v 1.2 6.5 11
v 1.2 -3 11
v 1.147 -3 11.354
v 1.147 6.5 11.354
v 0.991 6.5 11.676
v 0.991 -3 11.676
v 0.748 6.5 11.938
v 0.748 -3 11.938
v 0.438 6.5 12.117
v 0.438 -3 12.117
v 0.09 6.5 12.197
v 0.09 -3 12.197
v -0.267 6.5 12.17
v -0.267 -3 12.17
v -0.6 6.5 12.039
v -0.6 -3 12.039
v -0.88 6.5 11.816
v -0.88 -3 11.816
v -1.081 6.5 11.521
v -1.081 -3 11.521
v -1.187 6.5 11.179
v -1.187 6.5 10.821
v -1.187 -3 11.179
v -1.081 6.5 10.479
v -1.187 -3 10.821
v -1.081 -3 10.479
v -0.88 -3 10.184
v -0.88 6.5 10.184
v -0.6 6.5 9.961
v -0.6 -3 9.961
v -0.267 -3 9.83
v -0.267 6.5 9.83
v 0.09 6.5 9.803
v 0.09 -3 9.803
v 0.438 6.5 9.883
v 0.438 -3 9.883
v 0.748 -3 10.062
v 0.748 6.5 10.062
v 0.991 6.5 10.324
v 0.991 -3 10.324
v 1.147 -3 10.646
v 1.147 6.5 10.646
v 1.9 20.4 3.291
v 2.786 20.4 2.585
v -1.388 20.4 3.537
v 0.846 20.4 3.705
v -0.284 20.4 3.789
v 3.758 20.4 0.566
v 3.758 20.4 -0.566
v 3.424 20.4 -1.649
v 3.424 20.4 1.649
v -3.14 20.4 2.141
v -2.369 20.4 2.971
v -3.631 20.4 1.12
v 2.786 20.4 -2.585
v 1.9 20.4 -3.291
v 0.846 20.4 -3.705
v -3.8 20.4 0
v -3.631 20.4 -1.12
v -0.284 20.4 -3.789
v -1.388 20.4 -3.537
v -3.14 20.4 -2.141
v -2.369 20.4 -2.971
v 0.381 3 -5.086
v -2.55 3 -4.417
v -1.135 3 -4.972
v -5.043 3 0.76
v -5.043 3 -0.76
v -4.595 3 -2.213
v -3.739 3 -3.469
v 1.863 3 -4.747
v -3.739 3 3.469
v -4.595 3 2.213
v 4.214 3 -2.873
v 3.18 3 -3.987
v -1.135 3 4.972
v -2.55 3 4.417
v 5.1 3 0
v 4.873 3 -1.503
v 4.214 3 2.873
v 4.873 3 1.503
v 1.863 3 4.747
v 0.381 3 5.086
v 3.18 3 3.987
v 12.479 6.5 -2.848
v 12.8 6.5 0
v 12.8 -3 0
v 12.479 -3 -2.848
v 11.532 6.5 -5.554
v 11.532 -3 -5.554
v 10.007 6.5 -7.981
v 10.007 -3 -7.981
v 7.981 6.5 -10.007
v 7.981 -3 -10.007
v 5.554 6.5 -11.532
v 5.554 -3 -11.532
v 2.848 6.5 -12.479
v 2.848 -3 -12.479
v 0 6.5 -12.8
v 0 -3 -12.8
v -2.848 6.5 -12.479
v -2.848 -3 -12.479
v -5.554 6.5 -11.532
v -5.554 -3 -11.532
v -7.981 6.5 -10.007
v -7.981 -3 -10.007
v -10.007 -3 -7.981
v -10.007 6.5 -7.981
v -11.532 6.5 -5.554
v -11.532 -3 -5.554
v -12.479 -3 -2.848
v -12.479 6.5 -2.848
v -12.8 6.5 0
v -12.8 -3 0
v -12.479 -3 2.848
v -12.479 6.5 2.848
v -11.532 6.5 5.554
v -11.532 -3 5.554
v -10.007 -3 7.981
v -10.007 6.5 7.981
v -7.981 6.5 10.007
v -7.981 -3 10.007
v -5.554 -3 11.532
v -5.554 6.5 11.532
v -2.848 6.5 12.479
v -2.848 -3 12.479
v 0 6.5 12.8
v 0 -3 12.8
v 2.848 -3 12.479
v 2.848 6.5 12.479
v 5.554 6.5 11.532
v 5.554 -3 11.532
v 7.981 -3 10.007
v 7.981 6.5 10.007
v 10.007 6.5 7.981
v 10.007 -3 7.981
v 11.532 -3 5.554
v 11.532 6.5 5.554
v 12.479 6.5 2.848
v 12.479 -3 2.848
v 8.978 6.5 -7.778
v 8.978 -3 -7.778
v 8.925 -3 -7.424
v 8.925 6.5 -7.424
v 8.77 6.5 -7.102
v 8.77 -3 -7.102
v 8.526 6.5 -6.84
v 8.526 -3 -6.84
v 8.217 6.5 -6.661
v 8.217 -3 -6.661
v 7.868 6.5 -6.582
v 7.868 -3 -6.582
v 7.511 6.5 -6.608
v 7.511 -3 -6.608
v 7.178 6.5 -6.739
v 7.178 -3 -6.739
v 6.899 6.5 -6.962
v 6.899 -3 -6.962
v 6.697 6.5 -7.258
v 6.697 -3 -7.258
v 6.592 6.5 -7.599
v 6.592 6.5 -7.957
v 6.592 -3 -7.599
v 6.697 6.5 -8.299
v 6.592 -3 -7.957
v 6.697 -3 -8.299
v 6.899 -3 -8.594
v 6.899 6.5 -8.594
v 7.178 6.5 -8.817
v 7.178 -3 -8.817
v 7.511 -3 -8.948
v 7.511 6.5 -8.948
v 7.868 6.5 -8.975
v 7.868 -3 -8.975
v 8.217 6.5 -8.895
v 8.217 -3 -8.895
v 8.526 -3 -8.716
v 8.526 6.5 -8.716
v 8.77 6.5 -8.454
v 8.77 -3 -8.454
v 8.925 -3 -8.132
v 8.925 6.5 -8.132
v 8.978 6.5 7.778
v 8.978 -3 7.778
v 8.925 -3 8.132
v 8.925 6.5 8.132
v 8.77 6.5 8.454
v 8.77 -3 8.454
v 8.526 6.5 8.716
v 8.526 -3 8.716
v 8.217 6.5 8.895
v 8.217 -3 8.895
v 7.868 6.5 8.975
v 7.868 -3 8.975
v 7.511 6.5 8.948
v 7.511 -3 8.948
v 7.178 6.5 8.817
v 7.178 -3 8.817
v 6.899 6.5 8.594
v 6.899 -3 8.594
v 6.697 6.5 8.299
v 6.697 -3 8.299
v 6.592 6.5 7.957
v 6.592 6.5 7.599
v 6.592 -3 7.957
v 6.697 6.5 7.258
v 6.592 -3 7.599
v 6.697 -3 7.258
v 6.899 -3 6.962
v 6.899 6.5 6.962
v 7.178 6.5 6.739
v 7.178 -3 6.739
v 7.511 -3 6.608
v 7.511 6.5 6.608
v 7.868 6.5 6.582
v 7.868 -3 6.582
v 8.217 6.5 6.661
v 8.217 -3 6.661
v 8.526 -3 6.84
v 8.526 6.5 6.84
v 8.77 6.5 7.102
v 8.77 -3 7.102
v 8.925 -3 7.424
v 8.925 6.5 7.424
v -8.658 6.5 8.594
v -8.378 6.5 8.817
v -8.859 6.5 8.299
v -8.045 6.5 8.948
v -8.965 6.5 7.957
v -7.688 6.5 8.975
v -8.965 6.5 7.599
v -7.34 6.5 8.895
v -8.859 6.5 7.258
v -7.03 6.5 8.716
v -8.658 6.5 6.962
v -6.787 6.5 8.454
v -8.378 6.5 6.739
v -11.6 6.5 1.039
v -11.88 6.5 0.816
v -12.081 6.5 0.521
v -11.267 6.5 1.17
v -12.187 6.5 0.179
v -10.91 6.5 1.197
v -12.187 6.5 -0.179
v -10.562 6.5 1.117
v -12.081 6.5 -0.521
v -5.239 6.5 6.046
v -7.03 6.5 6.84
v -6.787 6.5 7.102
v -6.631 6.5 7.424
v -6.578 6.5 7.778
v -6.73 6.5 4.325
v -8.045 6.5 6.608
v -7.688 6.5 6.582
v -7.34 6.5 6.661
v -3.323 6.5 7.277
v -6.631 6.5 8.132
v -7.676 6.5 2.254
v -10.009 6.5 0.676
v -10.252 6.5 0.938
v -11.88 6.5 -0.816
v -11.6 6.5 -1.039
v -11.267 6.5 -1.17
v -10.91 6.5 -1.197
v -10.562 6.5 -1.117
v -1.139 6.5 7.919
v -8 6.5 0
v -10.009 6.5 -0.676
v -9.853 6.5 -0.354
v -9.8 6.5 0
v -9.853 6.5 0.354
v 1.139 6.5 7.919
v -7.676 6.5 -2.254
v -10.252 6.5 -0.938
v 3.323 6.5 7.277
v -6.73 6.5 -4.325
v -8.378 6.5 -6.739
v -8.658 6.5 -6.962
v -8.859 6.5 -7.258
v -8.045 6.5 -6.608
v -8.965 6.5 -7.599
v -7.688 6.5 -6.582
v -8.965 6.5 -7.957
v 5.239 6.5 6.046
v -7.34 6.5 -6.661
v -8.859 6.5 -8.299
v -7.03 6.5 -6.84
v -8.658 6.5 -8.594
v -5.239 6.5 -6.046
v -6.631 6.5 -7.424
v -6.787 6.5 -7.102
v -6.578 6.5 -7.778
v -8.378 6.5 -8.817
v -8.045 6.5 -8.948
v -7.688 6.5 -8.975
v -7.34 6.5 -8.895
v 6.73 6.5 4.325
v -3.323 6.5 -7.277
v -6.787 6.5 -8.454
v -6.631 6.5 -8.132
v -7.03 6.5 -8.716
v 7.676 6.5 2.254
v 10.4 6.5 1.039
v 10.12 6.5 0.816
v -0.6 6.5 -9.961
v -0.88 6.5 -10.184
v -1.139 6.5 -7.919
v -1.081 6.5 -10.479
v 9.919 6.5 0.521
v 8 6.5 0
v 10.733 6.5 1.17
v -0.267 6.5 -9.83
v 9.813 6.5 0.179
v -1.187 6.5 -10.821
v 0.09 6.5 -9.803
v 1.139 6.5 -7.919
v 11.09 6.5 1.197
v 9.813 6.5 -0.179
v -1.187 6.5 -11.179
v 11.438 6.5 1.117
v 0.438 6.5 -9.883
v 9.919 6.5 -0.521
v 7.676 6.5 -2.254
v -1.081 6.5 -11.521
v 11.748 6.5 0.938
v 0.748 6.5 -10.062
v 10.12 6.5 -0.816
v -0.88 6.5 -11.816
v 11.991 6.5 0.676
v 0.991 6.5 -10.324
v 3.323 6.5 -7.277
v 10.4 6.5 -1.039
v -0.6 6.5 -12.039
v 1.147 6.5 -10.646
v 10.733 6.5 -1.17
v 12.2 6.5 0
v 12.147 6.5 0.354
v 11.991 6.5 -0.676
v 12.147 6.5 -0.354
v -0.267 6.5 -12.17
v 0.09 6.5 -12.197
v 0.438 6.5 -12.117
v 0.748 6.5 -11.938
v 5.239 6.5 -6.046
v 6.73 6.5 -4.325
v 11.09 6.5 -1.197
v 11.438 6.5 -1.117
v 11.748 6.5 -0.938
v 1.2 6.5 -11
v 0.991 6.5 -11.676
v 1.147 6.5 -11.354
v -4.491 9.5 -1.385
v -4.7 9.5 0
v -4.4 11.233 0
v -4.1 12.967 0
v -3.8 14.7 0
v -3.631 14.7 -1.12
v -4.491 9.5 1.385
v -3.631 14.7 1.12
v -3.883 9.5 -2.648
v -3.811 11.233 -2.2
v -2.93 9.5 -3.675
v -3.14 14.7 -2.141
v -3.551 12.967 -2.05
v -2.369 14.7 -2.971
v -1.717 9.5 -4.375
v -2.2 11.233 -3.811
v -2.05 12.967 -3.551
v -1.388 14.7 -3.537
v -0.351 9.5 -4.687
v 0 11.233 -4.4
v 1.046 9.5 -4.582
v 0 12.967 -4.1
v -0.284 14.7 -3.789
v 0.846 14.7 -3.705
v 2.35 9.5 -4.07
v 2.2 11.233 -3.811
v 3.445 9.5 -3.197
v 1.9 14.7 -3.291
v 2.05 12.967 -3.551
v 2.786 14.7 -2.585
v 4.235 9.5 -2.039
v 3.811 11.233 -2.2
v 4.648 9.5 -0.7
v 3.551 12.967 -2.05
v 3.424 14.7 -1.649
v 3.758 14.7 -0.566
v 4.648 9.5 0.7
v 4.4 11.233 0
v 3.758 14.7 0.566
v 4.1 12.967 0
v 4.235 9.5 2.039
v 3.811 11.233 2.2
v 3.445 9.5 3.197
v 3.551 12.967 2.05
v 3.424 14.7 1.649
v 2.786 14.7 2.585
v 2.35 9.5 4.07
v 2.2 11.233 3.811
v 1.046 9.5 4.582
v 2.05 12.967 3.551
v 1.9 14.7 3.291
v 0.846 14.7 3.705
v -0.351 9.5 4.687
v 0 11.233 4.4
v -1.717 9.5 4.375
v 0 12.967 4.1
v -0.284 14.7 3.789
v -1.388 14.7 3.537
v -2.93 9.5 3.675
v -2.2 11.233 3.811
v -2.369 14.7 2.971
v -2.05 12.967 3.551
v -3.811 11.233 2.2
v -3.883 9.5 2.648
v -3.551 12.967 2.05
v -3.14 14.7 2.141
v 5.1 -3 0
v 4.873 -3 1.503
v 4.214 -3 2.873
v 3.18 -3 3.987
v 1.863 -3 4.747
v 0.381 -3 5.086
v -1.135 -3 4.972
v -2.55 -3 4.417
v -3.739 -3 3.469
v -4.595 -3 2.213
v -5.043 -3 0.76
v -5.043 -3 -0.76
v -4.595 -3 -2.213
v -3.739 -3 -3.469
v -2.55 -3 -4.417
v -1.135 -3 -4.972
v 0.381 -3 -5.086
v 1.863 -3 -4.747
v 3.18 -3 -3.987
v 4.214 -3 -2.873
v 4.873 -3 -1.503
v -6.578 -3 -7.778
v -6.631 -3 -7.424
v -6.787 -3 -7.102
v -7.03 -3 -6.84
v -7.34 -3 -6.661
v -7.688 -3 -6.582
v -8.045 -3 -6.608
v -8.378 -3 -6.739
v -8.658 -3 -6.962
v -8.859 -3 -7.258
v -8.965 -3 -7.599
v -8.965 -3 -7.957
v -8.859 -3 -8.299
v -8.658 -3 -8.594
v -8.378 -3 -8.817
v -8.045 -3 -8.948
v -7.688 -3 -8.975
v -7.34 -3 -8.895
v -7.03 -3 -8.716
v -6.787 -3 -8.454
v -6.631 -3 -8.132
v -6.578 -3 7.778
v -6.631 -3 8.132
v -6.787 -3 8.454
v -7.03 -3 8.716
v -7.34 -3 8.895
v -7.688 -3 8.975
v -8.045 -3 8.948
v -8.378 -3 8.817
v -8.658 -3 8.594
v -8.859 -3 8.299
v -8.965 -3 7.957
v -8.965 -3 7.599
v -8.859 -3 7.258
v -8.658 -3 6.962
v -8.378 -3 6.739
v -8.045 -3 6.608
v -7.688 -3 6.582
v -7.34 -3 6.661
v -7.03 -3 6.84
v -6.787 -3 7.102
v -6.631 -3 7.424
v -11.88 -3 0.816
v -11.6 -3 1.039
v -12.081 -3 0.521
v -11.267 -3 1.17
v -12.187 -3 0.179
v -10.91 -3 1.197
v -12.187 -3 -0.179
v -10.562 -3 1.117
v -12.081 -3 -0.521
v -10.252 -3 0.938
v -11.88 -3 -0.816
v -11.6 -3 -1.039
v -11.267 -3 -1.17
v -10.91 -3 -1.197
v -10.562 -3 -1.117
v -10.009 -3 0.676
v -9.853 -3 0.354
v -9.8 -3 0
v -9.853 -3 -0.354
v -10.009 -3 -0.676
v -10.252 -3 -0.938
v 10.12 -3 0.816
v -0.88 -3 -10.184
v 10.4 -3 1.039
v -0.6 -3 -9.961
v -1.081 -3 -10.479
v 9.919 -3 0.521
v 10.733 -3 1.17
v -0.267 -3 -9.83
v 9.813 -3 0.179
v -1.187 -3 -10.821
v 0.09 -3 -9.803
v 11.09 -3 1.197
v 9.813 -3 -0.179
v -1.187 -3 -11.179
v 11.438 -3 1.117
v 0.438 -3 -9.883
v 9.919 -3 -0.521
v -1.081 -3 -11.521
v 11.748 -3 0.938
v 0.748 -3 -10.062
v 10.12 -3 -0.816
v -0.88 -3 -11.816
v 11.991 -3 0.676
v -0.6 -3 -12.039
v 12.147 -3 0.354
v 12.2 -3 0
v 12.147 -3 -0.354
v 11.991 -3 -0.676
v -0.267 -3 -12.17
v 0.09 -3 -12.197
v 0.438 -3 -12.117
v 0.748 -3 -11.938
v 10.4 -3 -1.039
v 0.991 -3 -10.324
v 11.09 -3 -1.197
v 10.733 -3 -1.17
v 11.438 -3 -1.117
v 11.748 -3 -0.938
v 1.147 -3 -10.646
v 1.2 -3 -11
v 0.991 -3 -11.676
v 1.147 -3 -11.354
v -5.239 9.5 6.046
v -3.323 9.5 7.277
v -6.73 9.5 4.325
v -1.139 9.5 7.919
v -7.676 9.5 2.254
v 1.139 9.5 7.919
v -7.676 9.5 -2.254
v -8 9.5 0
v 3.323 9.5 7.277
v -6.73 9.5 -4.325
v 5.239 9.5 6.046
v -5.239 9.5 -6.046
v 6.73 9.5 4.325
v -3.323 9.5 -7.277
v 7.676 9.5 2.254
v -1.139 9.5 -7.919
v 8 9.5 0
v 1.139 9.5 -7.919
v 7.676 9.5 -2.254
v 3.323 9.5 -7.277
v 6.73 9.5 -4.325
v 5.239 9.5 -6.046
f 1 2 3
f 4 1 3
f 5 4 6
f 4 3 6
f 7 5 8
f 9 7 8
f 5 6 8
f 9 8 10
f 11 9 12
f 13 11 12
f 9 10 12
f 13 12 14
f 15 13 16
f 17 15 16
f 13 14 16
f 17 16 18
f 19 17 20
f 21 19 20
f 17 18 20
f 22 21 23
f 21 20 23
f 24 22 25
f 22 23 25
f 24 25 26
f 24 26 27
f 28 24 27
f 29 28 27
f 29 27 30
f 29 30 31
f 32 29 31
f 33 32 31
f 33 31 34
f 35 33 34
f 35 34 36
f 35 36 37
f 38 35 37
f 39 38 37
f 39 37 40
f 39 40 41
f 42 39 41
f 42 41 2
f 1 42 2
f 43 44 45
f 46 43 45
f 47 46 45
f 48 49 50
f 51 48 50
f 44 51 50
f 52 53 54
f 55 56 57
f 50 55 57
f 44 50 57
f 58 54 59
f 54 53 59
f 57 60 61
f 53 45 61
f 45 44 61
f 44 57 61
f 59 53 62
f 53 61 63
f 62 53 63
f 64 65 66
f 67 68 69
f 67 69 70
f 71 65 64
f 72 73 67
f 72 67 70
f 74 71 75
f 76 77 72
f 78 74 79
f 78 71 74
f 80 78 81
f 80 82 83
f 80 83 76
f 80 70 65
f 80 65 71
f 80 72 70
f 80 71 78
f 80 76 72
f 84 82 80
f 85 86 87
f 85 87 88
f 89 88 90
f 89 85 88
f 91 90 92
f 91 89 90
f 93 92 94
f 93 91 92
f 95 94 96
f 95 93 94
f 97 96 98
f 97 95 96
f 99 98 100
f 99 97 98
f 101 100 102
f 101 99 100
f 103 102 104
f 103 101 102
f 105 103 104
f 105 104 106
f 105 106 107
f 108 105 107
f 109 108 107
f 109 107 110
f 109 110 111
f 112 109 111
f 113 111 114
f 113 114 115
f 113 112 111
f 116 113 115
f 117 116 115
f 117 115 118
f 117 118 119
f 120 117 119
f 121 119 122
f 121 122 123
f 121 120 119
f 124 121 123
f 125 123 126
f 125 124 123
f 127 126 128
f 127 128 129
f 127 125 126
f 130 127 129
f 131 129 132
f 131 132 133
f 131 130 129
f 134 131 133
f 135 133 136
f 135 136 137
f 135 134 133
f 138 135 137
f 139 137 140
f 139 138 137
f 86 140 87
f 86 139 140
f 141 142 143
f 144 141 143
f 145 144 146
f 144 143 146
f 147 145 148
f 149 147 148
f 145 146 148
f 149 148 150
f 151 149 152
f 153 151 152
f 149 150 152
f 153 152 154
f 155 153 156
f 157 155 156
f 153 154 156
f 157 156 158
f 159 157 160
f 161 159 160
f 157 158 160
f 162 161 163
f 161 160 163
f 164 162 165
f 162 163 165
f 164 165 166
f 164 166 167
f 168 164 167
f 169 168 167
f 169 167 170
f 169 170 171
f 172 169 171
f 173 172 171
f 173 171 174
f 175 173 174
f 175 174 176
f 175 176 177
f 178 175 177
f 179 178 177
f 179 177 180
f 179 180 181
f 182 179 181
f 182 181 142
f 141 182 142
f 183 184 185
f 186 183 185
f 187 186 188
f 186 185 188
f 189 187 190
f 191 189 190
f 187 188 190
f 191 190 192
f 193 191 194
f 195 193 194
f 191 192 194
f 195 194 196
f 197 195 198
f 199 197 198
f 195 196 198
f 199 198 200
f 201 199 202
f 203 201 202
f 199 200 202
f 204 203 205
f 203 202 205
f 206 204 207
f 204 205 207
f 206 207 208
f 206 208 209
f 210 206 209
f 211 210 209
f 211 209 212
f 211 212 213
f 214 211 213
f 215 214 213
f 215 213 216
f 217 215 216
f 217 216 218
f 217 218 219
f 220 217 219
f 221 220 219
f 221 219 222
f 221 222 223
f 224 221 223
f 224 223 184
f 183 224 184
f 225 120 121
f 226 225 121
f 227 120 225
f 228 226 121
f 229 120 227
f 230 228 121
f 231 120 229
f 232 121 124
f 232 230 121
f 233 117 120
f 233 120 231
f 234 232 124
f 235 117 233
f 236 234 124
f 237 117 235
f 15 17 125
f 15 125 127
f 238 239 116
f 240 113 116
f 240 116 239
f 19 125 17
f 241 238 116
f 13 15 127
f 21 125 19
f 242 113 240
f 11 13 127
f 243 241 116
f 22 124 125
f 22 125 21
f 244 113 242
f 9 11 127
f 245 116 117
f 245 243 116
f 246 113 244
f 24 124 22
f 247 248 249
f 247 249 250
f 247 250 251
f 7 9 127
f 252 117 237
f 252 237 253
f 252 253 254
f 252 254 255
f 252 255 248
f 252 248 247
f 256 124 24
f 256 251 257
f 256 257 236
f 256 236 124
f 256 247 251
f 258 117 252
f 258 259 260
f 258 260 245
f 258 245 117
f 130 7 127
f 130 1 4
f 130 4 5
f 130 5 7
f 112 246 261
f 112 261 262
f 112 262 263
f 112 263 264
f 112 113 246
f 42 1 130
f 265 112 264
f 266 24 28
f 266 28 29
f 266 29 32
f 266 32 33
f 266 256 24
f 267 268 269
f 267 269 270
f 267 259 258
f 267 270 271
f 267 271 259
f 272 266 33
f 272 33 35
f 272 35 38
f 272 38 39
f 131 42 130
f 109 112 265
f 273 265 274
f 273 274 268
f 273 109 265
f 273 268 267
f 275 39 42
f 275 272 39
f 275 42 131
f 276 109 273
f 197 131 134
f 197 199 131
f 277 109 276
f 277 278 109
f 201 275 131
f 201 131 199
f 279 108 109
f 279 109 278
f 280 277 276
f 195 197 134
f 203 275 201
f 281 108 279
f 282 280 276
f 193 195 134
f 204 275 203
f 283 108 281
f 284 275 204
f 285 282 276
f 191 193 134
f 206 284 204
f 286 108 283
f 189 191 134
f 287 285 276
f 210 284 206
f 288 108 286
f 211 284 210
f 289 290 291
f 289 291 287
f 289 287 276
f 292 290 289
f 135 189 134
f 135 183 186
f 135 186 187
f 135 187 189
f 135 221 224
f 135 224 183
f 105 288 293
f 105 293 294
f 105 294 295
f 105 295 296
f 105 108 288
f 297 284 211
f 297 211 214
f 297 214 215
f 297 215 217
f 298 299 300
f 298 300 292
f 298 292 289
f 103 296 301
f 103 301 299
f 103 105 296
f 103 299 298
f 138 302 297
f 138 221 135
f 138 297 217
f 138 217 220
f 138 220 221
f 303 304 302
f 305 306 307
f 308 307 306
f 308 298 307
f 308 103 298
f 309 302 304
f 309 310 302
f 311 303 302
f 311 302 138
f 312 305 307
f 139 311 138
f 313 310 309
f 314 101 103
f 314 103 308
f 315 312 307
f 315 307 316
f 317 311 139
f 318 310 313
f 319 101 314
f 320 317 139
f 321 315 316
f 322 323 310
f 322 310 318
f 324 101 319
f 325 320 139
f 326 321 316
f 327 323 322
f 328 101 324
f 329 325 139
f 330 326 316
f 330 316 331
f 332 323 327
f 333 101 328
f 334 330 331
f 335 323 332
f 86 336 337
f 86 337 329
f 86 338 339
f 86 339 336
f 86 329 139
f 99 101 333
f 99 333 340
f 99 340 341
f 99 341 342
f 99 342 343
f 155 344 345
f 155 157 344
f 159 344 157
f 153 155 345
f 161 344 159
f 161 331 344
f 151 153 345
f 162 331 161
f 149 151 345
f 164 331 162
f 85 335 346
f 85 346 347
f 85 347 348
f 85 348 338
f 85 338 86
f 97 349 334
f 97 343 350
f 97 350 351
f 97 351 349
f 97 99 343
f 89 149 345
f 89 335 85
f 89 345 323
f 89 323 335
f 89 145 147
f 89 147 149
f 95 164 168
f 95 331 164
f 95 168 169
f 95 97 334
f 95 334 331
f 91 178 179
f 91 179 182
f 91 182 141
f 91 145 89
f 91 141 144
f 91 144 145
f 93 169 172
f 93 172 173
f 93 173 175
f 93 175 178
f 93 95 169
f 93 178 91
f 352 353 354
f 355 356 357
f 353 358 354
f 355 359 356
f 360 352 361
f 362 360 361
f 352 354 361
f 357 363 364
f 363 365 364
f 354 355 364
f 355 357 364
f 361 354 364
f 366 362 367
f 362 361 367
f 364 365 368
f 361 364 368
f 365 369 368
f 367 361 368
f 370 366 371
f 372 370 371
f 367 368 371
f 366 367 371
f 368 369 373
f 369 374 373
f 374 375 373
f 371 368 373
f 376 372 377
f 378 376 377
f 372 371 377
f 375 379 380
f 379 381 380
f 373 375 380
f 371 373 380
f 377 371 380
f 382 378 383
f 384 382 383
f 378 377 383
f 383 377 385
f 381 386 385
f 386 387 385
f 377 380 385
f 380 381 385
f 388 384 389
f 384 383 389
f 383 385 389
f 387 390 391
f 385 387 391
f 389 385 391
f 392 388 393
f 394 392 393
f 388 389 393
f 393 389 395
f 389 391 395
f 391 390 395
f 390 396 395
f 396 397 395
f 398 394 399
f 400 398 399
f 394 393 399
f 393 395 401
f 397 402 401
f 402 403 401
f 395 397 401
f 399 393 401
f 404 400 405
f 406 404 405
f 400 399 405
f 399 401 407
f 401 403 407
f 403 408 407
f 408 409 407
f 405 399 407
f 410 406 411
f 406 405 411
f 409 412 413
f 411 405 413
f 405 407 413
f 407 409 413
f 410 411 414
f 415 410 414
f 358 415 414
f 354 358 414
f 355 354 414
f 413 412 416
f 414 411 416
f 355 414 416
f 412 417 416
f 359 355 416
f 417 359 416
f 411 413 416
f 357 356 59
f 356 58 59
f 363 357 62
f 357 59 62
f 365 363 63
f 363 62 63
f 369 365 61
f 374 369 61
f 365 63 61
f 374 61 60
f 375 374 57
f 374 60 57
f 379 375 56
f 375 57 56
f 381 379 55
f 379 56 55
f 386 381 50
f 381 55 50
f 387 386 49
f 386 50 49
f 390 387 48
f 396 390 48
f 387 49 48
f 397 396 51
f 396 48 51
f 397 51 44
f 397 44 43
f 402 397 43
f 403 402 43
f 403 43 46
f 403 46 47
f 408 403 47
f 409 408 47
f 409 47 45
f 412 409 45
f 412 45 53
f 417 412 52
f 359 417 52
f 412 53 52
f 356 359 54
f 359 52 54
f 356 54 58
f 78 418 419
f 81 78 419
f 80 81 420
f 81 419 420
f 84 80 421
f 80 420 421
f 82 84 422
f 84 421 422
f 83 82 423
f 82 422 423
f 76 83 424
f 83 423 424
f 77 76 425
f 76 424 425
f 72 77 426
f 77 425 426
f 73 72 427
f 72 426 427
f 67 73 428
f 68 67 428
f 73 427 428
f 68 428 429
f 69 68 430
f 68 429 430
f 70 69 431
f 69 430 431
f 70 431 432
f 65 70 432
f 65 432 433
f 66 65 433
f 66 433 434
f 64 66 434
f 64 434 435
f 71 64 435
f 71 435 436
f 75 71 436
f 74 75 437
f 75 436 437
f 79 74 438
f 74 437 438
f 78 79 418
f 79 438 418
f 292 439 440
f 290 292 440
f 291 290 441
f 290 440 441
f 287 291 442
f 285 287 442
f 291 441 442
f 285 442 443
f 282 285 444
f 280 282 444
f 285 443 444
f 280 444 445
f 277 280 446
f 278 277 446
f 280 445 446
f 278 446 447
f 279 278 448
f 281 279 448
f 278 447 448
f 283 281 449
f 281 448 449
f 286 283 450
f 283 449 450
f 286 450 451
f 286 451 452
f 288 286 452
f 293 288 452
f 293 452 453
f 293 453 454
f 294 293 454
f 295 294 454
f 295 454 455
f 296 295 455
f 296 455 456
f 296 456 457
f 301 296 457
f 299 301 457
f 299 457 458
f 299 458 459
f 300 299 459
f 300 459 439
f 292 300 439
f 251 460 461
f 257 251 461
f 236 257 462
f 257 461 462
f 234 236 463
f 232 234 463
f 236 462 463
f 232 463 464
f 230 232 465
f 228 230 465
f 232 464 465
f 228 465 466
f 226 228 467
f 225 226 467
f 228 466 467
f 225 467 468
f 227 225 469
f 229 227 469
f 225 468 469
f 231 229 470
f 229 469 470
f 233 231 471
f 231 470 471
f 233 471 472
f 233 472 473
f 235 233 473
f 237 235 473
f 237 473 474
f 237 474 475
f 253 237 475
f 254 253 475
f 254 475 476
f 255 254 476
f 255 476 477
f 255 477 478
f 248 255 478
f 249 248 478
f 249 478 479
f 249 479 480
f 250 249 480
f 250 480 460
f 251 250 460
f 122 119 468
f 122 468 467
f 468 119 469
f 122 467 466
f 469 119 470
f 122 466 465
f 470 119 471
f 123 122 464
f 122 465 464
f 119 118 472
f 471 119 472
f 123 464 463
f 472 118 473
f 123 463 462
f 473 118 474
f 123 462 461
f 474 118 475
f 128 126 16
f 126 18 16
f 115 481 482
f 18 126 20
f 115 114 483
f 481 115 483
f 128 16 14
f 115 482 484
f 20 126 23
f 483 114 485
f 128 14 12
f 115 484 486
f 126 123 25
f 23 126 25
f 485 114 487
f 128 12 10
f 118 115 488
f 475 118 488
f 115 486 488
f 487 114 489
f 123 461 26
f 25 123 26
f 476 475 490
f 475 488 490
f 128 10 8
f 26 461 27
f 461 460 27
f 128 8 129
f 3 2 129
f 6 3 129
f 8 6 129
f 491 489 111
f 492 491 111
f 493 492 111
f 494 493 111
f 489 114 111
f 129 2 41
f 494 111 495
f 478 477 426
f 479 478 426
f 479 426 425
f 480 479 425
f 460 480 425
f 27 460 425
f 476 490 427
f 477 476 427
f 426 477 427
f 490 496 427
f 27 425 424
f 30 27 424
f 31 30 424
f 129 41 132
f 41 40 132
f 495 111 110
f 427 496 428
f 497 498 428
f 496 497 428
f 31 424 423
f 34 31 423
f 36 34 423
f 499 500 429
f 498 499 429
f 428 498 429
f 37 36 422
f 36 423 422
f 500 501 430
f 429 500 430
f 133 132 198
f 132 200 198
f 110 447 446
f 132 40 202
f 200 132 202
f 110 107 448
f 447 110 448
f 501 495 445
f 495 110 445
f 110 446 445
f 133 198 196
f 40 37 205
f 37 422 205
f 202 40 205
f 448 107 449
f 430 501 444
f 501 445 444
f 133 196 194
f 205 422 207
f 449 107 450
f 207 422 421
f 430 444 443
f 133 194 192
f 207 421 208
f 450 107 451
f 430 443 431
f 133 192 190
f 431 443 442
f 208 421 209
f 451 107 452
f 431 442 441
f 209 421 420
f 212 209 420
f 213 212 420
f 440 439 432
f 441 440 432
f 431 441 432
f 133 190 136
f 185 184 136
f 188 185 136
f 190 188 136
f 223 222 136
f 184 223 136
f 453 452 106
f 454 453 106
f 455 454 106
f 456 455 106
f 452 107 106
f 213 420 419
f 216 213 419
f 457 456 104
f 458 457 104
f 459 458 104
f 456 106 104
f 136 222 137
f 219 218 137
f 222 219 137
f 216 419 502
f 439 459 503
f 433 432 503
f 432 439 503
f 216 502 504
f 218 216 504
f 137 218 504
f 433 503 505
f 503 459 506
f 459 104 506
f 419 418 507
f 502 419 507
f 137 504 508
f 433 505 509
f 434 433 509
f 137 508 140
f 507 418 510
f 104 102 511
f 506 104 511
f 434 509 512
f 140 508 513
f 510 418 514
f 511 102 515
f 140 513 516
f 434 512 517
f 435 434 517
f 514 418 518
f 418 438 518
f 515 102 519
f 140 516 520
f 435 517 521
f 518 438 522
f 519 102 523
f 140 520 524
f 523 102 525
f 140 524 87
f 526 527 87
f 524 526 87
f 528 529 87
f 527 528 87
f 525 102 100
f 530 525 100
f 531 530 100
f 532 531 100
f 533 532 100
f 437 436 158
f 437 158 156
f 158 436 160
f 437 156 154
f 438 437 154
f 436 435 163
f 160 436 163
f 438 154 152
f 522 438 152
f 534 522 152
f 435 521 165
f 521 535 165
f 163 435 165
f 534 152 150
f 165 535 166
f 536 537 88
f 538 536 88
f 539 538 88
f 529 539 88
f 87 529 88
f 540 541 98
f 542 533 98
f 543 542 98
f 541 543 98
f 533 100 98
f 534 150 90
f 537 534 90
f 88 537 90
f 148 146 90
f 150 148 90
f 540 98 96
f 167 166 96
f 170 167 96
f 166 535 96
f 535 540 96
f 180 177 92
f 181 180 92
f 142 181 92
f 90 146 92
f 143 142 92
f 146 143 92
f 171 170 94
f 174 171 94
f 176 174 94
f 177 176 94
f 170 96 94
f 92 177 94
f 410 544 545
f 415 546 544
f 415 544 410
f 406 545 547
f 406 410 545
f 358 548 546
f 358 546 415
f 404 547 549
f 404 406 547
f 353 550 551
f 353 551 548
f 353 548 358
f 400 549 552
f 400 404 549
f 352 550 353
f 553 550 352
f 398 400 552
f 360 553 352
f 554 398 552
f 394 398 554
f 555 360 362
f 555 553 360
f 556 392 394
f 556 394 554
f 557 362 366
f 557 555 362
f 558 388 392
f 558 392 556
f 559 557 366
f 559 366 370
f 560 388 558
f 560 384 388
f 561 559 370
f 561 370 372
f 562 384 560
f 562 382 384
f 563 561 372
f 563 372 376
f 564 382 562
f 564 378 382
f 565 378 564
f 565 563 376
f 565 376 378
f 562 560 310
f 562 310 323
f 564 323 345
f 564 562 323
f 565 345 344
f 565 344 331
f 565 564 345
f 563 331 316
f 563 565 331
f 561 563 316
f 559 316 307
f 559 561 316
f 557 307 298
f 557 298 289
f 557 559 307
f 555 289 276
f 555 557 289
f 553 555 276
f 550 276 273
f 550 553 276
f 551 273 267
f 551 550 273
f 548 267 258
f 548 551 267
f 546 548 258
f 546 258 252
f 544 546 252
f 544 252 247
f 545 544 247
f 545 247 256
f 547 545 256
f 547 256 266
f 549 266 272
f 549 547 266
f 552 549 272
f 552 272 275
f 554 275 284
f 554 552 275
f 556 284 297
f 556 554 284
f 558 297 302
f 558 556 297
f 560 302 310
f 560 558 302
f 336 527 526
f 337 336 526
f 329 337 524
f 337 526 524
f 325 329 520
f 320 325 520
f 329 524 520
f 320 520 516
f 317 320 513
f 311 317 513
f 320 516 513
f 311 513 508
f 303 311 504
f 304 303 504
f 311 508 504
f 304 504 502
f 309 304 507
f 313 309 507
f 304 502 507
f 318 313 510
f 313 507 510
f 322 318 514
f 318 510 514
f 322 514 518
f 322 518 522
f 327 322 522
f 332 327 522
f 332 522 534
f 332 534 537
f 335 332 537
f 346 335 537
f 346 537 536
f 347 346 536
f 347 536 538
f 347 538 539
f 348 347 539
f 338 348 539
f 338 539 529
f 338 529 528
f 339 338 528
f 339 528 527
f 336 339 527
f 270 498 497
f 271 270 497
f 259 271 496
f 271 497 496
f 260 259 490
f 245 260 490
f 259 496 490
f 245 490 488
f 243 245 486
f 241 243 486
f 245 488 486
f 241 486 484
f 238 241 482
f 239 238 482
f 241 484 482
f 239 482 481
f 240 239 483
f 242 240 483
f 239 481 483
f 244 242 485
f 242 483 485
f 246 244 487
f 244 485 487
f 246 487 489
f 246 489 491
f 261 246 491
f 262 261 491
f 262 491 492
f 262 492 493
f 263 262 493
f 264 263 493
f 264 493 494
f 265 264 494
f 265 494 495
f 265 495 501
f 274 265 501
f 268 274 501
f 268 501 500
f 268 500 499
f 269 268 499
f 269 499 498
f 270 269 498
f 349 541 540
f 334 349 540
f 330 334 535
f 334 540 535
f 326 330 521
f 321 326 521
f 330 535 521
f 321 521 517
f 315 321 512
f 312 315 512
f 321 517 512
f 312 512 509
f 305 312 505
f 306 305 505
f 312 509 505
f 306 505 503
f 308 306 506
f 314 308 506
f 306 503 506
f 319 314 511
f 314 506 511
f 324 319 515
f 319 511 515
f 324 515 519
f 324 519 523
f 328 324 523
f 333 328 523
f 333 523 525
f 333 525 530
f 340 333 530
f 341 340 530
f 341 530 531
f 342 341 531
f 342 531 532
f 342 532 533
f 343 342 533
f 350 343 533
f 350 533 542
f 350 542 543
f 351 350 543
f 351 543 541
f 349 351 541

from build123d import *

# Parameters (mm, degrees)
SKETCH_1_R           = 12.8
EXTRUDE_1_DEPTH      = 9.5
EXTRUDE_1_DEPTH_BACK = 3
SKETCH_24_R          = 1.2
CUT_EXTRUDE_1_DEPTH  = 24.4
SKETCH_25_R          = 5.1
CUT_EXTRUDE_2_DEPTH  = 6
SKETCH_26_R          = 12.8
SKETCH_26_R_2        = 8
CUT_EXTRUDE_4_DEPTH  = 3


with BuildPart() as part:
    # 스케치1 → 보스-돌출1 (new body, two sides)
    with BuildSketch(Plane(origin=(0, 0, 0), x_dir=(1, 0, 0), z_dir=(0, 1, 0))) as extrude_1_sk:
        Circle(SKETCH_1_R)
    extrude(amount=EXTRUDE_1_DEPTH)
    extrude(extrude_1_sk.sketch, amount=-EXTRUDE_1_DEPTH_BACK)

    # 스케치18 → 회전1 (revolve)
    with BuildSketch(Plane.XY):
        Polygon((0, 9.5), (-4.7, 9.5), (-3.8, 14.7), (-3.8, 20.4), (0, 20.4), (0, 14.7), align=None)
    revolve(axis=Axis((0, 15.188164867, 0), (0, -1, 0)))

    # 스케치24 → 컷-돌출1 (cut, through all)
    with BuildSketch(Plane.XZ.offset(3)):
        with Locations((0, 11)):
            Circle(SKETCH_24_R)
        with Locations((7.778174593, 7.778174593)):
            Circle(SKETCH_24_R)
        with Locations((11, 0)):
            Circle(SKETCH_24_R)
        with Locations((0, -11)):
            Circle(SKETCH_24_R)
        with Locations((-7.778174593, -7.778174593)):
            Circle(SKETCH_24_R)
        with Locations((-7.778174593, 7.778174593)):
            Circle(SKETCH_24_R)
        with Locations((7.778174593, -7.778174593)):
            Circle(SKETCH_24_R)
        with Locations((-11, 0)):
            Circle(SKETCH_24_R)
    extrude(amount=-CUT_EXTRUDE_1_DEPTH, mode=Mode.SUBTRACT)

    # 스케치25 → 컷-돌출2 (cut)
    with BuildSketch(Plane.XZ.offset(3)):
        Circle(SKETCH_25_R)
    extrude(amount=-CUT_EXTRUDE_2_DEPTH, mode=Mode.SUBTRACT)

    # 스케치26 → 컷-돌출4 (cut)
    with BuildSketch(Plane(origin=(0, 9.5, 0), x_dir=(1, 0, 0), z_dir=(0, 1, 0))):
        Circle(SKETCH_26_R)
        Circle(SKETCH_26_R_2, mode=Mode.SUBTRACT)
    extrude(amount=-CUT_EXTRUDE_4_DEPTH, mode=Mode.SUBTRACT)


solid = part.part
